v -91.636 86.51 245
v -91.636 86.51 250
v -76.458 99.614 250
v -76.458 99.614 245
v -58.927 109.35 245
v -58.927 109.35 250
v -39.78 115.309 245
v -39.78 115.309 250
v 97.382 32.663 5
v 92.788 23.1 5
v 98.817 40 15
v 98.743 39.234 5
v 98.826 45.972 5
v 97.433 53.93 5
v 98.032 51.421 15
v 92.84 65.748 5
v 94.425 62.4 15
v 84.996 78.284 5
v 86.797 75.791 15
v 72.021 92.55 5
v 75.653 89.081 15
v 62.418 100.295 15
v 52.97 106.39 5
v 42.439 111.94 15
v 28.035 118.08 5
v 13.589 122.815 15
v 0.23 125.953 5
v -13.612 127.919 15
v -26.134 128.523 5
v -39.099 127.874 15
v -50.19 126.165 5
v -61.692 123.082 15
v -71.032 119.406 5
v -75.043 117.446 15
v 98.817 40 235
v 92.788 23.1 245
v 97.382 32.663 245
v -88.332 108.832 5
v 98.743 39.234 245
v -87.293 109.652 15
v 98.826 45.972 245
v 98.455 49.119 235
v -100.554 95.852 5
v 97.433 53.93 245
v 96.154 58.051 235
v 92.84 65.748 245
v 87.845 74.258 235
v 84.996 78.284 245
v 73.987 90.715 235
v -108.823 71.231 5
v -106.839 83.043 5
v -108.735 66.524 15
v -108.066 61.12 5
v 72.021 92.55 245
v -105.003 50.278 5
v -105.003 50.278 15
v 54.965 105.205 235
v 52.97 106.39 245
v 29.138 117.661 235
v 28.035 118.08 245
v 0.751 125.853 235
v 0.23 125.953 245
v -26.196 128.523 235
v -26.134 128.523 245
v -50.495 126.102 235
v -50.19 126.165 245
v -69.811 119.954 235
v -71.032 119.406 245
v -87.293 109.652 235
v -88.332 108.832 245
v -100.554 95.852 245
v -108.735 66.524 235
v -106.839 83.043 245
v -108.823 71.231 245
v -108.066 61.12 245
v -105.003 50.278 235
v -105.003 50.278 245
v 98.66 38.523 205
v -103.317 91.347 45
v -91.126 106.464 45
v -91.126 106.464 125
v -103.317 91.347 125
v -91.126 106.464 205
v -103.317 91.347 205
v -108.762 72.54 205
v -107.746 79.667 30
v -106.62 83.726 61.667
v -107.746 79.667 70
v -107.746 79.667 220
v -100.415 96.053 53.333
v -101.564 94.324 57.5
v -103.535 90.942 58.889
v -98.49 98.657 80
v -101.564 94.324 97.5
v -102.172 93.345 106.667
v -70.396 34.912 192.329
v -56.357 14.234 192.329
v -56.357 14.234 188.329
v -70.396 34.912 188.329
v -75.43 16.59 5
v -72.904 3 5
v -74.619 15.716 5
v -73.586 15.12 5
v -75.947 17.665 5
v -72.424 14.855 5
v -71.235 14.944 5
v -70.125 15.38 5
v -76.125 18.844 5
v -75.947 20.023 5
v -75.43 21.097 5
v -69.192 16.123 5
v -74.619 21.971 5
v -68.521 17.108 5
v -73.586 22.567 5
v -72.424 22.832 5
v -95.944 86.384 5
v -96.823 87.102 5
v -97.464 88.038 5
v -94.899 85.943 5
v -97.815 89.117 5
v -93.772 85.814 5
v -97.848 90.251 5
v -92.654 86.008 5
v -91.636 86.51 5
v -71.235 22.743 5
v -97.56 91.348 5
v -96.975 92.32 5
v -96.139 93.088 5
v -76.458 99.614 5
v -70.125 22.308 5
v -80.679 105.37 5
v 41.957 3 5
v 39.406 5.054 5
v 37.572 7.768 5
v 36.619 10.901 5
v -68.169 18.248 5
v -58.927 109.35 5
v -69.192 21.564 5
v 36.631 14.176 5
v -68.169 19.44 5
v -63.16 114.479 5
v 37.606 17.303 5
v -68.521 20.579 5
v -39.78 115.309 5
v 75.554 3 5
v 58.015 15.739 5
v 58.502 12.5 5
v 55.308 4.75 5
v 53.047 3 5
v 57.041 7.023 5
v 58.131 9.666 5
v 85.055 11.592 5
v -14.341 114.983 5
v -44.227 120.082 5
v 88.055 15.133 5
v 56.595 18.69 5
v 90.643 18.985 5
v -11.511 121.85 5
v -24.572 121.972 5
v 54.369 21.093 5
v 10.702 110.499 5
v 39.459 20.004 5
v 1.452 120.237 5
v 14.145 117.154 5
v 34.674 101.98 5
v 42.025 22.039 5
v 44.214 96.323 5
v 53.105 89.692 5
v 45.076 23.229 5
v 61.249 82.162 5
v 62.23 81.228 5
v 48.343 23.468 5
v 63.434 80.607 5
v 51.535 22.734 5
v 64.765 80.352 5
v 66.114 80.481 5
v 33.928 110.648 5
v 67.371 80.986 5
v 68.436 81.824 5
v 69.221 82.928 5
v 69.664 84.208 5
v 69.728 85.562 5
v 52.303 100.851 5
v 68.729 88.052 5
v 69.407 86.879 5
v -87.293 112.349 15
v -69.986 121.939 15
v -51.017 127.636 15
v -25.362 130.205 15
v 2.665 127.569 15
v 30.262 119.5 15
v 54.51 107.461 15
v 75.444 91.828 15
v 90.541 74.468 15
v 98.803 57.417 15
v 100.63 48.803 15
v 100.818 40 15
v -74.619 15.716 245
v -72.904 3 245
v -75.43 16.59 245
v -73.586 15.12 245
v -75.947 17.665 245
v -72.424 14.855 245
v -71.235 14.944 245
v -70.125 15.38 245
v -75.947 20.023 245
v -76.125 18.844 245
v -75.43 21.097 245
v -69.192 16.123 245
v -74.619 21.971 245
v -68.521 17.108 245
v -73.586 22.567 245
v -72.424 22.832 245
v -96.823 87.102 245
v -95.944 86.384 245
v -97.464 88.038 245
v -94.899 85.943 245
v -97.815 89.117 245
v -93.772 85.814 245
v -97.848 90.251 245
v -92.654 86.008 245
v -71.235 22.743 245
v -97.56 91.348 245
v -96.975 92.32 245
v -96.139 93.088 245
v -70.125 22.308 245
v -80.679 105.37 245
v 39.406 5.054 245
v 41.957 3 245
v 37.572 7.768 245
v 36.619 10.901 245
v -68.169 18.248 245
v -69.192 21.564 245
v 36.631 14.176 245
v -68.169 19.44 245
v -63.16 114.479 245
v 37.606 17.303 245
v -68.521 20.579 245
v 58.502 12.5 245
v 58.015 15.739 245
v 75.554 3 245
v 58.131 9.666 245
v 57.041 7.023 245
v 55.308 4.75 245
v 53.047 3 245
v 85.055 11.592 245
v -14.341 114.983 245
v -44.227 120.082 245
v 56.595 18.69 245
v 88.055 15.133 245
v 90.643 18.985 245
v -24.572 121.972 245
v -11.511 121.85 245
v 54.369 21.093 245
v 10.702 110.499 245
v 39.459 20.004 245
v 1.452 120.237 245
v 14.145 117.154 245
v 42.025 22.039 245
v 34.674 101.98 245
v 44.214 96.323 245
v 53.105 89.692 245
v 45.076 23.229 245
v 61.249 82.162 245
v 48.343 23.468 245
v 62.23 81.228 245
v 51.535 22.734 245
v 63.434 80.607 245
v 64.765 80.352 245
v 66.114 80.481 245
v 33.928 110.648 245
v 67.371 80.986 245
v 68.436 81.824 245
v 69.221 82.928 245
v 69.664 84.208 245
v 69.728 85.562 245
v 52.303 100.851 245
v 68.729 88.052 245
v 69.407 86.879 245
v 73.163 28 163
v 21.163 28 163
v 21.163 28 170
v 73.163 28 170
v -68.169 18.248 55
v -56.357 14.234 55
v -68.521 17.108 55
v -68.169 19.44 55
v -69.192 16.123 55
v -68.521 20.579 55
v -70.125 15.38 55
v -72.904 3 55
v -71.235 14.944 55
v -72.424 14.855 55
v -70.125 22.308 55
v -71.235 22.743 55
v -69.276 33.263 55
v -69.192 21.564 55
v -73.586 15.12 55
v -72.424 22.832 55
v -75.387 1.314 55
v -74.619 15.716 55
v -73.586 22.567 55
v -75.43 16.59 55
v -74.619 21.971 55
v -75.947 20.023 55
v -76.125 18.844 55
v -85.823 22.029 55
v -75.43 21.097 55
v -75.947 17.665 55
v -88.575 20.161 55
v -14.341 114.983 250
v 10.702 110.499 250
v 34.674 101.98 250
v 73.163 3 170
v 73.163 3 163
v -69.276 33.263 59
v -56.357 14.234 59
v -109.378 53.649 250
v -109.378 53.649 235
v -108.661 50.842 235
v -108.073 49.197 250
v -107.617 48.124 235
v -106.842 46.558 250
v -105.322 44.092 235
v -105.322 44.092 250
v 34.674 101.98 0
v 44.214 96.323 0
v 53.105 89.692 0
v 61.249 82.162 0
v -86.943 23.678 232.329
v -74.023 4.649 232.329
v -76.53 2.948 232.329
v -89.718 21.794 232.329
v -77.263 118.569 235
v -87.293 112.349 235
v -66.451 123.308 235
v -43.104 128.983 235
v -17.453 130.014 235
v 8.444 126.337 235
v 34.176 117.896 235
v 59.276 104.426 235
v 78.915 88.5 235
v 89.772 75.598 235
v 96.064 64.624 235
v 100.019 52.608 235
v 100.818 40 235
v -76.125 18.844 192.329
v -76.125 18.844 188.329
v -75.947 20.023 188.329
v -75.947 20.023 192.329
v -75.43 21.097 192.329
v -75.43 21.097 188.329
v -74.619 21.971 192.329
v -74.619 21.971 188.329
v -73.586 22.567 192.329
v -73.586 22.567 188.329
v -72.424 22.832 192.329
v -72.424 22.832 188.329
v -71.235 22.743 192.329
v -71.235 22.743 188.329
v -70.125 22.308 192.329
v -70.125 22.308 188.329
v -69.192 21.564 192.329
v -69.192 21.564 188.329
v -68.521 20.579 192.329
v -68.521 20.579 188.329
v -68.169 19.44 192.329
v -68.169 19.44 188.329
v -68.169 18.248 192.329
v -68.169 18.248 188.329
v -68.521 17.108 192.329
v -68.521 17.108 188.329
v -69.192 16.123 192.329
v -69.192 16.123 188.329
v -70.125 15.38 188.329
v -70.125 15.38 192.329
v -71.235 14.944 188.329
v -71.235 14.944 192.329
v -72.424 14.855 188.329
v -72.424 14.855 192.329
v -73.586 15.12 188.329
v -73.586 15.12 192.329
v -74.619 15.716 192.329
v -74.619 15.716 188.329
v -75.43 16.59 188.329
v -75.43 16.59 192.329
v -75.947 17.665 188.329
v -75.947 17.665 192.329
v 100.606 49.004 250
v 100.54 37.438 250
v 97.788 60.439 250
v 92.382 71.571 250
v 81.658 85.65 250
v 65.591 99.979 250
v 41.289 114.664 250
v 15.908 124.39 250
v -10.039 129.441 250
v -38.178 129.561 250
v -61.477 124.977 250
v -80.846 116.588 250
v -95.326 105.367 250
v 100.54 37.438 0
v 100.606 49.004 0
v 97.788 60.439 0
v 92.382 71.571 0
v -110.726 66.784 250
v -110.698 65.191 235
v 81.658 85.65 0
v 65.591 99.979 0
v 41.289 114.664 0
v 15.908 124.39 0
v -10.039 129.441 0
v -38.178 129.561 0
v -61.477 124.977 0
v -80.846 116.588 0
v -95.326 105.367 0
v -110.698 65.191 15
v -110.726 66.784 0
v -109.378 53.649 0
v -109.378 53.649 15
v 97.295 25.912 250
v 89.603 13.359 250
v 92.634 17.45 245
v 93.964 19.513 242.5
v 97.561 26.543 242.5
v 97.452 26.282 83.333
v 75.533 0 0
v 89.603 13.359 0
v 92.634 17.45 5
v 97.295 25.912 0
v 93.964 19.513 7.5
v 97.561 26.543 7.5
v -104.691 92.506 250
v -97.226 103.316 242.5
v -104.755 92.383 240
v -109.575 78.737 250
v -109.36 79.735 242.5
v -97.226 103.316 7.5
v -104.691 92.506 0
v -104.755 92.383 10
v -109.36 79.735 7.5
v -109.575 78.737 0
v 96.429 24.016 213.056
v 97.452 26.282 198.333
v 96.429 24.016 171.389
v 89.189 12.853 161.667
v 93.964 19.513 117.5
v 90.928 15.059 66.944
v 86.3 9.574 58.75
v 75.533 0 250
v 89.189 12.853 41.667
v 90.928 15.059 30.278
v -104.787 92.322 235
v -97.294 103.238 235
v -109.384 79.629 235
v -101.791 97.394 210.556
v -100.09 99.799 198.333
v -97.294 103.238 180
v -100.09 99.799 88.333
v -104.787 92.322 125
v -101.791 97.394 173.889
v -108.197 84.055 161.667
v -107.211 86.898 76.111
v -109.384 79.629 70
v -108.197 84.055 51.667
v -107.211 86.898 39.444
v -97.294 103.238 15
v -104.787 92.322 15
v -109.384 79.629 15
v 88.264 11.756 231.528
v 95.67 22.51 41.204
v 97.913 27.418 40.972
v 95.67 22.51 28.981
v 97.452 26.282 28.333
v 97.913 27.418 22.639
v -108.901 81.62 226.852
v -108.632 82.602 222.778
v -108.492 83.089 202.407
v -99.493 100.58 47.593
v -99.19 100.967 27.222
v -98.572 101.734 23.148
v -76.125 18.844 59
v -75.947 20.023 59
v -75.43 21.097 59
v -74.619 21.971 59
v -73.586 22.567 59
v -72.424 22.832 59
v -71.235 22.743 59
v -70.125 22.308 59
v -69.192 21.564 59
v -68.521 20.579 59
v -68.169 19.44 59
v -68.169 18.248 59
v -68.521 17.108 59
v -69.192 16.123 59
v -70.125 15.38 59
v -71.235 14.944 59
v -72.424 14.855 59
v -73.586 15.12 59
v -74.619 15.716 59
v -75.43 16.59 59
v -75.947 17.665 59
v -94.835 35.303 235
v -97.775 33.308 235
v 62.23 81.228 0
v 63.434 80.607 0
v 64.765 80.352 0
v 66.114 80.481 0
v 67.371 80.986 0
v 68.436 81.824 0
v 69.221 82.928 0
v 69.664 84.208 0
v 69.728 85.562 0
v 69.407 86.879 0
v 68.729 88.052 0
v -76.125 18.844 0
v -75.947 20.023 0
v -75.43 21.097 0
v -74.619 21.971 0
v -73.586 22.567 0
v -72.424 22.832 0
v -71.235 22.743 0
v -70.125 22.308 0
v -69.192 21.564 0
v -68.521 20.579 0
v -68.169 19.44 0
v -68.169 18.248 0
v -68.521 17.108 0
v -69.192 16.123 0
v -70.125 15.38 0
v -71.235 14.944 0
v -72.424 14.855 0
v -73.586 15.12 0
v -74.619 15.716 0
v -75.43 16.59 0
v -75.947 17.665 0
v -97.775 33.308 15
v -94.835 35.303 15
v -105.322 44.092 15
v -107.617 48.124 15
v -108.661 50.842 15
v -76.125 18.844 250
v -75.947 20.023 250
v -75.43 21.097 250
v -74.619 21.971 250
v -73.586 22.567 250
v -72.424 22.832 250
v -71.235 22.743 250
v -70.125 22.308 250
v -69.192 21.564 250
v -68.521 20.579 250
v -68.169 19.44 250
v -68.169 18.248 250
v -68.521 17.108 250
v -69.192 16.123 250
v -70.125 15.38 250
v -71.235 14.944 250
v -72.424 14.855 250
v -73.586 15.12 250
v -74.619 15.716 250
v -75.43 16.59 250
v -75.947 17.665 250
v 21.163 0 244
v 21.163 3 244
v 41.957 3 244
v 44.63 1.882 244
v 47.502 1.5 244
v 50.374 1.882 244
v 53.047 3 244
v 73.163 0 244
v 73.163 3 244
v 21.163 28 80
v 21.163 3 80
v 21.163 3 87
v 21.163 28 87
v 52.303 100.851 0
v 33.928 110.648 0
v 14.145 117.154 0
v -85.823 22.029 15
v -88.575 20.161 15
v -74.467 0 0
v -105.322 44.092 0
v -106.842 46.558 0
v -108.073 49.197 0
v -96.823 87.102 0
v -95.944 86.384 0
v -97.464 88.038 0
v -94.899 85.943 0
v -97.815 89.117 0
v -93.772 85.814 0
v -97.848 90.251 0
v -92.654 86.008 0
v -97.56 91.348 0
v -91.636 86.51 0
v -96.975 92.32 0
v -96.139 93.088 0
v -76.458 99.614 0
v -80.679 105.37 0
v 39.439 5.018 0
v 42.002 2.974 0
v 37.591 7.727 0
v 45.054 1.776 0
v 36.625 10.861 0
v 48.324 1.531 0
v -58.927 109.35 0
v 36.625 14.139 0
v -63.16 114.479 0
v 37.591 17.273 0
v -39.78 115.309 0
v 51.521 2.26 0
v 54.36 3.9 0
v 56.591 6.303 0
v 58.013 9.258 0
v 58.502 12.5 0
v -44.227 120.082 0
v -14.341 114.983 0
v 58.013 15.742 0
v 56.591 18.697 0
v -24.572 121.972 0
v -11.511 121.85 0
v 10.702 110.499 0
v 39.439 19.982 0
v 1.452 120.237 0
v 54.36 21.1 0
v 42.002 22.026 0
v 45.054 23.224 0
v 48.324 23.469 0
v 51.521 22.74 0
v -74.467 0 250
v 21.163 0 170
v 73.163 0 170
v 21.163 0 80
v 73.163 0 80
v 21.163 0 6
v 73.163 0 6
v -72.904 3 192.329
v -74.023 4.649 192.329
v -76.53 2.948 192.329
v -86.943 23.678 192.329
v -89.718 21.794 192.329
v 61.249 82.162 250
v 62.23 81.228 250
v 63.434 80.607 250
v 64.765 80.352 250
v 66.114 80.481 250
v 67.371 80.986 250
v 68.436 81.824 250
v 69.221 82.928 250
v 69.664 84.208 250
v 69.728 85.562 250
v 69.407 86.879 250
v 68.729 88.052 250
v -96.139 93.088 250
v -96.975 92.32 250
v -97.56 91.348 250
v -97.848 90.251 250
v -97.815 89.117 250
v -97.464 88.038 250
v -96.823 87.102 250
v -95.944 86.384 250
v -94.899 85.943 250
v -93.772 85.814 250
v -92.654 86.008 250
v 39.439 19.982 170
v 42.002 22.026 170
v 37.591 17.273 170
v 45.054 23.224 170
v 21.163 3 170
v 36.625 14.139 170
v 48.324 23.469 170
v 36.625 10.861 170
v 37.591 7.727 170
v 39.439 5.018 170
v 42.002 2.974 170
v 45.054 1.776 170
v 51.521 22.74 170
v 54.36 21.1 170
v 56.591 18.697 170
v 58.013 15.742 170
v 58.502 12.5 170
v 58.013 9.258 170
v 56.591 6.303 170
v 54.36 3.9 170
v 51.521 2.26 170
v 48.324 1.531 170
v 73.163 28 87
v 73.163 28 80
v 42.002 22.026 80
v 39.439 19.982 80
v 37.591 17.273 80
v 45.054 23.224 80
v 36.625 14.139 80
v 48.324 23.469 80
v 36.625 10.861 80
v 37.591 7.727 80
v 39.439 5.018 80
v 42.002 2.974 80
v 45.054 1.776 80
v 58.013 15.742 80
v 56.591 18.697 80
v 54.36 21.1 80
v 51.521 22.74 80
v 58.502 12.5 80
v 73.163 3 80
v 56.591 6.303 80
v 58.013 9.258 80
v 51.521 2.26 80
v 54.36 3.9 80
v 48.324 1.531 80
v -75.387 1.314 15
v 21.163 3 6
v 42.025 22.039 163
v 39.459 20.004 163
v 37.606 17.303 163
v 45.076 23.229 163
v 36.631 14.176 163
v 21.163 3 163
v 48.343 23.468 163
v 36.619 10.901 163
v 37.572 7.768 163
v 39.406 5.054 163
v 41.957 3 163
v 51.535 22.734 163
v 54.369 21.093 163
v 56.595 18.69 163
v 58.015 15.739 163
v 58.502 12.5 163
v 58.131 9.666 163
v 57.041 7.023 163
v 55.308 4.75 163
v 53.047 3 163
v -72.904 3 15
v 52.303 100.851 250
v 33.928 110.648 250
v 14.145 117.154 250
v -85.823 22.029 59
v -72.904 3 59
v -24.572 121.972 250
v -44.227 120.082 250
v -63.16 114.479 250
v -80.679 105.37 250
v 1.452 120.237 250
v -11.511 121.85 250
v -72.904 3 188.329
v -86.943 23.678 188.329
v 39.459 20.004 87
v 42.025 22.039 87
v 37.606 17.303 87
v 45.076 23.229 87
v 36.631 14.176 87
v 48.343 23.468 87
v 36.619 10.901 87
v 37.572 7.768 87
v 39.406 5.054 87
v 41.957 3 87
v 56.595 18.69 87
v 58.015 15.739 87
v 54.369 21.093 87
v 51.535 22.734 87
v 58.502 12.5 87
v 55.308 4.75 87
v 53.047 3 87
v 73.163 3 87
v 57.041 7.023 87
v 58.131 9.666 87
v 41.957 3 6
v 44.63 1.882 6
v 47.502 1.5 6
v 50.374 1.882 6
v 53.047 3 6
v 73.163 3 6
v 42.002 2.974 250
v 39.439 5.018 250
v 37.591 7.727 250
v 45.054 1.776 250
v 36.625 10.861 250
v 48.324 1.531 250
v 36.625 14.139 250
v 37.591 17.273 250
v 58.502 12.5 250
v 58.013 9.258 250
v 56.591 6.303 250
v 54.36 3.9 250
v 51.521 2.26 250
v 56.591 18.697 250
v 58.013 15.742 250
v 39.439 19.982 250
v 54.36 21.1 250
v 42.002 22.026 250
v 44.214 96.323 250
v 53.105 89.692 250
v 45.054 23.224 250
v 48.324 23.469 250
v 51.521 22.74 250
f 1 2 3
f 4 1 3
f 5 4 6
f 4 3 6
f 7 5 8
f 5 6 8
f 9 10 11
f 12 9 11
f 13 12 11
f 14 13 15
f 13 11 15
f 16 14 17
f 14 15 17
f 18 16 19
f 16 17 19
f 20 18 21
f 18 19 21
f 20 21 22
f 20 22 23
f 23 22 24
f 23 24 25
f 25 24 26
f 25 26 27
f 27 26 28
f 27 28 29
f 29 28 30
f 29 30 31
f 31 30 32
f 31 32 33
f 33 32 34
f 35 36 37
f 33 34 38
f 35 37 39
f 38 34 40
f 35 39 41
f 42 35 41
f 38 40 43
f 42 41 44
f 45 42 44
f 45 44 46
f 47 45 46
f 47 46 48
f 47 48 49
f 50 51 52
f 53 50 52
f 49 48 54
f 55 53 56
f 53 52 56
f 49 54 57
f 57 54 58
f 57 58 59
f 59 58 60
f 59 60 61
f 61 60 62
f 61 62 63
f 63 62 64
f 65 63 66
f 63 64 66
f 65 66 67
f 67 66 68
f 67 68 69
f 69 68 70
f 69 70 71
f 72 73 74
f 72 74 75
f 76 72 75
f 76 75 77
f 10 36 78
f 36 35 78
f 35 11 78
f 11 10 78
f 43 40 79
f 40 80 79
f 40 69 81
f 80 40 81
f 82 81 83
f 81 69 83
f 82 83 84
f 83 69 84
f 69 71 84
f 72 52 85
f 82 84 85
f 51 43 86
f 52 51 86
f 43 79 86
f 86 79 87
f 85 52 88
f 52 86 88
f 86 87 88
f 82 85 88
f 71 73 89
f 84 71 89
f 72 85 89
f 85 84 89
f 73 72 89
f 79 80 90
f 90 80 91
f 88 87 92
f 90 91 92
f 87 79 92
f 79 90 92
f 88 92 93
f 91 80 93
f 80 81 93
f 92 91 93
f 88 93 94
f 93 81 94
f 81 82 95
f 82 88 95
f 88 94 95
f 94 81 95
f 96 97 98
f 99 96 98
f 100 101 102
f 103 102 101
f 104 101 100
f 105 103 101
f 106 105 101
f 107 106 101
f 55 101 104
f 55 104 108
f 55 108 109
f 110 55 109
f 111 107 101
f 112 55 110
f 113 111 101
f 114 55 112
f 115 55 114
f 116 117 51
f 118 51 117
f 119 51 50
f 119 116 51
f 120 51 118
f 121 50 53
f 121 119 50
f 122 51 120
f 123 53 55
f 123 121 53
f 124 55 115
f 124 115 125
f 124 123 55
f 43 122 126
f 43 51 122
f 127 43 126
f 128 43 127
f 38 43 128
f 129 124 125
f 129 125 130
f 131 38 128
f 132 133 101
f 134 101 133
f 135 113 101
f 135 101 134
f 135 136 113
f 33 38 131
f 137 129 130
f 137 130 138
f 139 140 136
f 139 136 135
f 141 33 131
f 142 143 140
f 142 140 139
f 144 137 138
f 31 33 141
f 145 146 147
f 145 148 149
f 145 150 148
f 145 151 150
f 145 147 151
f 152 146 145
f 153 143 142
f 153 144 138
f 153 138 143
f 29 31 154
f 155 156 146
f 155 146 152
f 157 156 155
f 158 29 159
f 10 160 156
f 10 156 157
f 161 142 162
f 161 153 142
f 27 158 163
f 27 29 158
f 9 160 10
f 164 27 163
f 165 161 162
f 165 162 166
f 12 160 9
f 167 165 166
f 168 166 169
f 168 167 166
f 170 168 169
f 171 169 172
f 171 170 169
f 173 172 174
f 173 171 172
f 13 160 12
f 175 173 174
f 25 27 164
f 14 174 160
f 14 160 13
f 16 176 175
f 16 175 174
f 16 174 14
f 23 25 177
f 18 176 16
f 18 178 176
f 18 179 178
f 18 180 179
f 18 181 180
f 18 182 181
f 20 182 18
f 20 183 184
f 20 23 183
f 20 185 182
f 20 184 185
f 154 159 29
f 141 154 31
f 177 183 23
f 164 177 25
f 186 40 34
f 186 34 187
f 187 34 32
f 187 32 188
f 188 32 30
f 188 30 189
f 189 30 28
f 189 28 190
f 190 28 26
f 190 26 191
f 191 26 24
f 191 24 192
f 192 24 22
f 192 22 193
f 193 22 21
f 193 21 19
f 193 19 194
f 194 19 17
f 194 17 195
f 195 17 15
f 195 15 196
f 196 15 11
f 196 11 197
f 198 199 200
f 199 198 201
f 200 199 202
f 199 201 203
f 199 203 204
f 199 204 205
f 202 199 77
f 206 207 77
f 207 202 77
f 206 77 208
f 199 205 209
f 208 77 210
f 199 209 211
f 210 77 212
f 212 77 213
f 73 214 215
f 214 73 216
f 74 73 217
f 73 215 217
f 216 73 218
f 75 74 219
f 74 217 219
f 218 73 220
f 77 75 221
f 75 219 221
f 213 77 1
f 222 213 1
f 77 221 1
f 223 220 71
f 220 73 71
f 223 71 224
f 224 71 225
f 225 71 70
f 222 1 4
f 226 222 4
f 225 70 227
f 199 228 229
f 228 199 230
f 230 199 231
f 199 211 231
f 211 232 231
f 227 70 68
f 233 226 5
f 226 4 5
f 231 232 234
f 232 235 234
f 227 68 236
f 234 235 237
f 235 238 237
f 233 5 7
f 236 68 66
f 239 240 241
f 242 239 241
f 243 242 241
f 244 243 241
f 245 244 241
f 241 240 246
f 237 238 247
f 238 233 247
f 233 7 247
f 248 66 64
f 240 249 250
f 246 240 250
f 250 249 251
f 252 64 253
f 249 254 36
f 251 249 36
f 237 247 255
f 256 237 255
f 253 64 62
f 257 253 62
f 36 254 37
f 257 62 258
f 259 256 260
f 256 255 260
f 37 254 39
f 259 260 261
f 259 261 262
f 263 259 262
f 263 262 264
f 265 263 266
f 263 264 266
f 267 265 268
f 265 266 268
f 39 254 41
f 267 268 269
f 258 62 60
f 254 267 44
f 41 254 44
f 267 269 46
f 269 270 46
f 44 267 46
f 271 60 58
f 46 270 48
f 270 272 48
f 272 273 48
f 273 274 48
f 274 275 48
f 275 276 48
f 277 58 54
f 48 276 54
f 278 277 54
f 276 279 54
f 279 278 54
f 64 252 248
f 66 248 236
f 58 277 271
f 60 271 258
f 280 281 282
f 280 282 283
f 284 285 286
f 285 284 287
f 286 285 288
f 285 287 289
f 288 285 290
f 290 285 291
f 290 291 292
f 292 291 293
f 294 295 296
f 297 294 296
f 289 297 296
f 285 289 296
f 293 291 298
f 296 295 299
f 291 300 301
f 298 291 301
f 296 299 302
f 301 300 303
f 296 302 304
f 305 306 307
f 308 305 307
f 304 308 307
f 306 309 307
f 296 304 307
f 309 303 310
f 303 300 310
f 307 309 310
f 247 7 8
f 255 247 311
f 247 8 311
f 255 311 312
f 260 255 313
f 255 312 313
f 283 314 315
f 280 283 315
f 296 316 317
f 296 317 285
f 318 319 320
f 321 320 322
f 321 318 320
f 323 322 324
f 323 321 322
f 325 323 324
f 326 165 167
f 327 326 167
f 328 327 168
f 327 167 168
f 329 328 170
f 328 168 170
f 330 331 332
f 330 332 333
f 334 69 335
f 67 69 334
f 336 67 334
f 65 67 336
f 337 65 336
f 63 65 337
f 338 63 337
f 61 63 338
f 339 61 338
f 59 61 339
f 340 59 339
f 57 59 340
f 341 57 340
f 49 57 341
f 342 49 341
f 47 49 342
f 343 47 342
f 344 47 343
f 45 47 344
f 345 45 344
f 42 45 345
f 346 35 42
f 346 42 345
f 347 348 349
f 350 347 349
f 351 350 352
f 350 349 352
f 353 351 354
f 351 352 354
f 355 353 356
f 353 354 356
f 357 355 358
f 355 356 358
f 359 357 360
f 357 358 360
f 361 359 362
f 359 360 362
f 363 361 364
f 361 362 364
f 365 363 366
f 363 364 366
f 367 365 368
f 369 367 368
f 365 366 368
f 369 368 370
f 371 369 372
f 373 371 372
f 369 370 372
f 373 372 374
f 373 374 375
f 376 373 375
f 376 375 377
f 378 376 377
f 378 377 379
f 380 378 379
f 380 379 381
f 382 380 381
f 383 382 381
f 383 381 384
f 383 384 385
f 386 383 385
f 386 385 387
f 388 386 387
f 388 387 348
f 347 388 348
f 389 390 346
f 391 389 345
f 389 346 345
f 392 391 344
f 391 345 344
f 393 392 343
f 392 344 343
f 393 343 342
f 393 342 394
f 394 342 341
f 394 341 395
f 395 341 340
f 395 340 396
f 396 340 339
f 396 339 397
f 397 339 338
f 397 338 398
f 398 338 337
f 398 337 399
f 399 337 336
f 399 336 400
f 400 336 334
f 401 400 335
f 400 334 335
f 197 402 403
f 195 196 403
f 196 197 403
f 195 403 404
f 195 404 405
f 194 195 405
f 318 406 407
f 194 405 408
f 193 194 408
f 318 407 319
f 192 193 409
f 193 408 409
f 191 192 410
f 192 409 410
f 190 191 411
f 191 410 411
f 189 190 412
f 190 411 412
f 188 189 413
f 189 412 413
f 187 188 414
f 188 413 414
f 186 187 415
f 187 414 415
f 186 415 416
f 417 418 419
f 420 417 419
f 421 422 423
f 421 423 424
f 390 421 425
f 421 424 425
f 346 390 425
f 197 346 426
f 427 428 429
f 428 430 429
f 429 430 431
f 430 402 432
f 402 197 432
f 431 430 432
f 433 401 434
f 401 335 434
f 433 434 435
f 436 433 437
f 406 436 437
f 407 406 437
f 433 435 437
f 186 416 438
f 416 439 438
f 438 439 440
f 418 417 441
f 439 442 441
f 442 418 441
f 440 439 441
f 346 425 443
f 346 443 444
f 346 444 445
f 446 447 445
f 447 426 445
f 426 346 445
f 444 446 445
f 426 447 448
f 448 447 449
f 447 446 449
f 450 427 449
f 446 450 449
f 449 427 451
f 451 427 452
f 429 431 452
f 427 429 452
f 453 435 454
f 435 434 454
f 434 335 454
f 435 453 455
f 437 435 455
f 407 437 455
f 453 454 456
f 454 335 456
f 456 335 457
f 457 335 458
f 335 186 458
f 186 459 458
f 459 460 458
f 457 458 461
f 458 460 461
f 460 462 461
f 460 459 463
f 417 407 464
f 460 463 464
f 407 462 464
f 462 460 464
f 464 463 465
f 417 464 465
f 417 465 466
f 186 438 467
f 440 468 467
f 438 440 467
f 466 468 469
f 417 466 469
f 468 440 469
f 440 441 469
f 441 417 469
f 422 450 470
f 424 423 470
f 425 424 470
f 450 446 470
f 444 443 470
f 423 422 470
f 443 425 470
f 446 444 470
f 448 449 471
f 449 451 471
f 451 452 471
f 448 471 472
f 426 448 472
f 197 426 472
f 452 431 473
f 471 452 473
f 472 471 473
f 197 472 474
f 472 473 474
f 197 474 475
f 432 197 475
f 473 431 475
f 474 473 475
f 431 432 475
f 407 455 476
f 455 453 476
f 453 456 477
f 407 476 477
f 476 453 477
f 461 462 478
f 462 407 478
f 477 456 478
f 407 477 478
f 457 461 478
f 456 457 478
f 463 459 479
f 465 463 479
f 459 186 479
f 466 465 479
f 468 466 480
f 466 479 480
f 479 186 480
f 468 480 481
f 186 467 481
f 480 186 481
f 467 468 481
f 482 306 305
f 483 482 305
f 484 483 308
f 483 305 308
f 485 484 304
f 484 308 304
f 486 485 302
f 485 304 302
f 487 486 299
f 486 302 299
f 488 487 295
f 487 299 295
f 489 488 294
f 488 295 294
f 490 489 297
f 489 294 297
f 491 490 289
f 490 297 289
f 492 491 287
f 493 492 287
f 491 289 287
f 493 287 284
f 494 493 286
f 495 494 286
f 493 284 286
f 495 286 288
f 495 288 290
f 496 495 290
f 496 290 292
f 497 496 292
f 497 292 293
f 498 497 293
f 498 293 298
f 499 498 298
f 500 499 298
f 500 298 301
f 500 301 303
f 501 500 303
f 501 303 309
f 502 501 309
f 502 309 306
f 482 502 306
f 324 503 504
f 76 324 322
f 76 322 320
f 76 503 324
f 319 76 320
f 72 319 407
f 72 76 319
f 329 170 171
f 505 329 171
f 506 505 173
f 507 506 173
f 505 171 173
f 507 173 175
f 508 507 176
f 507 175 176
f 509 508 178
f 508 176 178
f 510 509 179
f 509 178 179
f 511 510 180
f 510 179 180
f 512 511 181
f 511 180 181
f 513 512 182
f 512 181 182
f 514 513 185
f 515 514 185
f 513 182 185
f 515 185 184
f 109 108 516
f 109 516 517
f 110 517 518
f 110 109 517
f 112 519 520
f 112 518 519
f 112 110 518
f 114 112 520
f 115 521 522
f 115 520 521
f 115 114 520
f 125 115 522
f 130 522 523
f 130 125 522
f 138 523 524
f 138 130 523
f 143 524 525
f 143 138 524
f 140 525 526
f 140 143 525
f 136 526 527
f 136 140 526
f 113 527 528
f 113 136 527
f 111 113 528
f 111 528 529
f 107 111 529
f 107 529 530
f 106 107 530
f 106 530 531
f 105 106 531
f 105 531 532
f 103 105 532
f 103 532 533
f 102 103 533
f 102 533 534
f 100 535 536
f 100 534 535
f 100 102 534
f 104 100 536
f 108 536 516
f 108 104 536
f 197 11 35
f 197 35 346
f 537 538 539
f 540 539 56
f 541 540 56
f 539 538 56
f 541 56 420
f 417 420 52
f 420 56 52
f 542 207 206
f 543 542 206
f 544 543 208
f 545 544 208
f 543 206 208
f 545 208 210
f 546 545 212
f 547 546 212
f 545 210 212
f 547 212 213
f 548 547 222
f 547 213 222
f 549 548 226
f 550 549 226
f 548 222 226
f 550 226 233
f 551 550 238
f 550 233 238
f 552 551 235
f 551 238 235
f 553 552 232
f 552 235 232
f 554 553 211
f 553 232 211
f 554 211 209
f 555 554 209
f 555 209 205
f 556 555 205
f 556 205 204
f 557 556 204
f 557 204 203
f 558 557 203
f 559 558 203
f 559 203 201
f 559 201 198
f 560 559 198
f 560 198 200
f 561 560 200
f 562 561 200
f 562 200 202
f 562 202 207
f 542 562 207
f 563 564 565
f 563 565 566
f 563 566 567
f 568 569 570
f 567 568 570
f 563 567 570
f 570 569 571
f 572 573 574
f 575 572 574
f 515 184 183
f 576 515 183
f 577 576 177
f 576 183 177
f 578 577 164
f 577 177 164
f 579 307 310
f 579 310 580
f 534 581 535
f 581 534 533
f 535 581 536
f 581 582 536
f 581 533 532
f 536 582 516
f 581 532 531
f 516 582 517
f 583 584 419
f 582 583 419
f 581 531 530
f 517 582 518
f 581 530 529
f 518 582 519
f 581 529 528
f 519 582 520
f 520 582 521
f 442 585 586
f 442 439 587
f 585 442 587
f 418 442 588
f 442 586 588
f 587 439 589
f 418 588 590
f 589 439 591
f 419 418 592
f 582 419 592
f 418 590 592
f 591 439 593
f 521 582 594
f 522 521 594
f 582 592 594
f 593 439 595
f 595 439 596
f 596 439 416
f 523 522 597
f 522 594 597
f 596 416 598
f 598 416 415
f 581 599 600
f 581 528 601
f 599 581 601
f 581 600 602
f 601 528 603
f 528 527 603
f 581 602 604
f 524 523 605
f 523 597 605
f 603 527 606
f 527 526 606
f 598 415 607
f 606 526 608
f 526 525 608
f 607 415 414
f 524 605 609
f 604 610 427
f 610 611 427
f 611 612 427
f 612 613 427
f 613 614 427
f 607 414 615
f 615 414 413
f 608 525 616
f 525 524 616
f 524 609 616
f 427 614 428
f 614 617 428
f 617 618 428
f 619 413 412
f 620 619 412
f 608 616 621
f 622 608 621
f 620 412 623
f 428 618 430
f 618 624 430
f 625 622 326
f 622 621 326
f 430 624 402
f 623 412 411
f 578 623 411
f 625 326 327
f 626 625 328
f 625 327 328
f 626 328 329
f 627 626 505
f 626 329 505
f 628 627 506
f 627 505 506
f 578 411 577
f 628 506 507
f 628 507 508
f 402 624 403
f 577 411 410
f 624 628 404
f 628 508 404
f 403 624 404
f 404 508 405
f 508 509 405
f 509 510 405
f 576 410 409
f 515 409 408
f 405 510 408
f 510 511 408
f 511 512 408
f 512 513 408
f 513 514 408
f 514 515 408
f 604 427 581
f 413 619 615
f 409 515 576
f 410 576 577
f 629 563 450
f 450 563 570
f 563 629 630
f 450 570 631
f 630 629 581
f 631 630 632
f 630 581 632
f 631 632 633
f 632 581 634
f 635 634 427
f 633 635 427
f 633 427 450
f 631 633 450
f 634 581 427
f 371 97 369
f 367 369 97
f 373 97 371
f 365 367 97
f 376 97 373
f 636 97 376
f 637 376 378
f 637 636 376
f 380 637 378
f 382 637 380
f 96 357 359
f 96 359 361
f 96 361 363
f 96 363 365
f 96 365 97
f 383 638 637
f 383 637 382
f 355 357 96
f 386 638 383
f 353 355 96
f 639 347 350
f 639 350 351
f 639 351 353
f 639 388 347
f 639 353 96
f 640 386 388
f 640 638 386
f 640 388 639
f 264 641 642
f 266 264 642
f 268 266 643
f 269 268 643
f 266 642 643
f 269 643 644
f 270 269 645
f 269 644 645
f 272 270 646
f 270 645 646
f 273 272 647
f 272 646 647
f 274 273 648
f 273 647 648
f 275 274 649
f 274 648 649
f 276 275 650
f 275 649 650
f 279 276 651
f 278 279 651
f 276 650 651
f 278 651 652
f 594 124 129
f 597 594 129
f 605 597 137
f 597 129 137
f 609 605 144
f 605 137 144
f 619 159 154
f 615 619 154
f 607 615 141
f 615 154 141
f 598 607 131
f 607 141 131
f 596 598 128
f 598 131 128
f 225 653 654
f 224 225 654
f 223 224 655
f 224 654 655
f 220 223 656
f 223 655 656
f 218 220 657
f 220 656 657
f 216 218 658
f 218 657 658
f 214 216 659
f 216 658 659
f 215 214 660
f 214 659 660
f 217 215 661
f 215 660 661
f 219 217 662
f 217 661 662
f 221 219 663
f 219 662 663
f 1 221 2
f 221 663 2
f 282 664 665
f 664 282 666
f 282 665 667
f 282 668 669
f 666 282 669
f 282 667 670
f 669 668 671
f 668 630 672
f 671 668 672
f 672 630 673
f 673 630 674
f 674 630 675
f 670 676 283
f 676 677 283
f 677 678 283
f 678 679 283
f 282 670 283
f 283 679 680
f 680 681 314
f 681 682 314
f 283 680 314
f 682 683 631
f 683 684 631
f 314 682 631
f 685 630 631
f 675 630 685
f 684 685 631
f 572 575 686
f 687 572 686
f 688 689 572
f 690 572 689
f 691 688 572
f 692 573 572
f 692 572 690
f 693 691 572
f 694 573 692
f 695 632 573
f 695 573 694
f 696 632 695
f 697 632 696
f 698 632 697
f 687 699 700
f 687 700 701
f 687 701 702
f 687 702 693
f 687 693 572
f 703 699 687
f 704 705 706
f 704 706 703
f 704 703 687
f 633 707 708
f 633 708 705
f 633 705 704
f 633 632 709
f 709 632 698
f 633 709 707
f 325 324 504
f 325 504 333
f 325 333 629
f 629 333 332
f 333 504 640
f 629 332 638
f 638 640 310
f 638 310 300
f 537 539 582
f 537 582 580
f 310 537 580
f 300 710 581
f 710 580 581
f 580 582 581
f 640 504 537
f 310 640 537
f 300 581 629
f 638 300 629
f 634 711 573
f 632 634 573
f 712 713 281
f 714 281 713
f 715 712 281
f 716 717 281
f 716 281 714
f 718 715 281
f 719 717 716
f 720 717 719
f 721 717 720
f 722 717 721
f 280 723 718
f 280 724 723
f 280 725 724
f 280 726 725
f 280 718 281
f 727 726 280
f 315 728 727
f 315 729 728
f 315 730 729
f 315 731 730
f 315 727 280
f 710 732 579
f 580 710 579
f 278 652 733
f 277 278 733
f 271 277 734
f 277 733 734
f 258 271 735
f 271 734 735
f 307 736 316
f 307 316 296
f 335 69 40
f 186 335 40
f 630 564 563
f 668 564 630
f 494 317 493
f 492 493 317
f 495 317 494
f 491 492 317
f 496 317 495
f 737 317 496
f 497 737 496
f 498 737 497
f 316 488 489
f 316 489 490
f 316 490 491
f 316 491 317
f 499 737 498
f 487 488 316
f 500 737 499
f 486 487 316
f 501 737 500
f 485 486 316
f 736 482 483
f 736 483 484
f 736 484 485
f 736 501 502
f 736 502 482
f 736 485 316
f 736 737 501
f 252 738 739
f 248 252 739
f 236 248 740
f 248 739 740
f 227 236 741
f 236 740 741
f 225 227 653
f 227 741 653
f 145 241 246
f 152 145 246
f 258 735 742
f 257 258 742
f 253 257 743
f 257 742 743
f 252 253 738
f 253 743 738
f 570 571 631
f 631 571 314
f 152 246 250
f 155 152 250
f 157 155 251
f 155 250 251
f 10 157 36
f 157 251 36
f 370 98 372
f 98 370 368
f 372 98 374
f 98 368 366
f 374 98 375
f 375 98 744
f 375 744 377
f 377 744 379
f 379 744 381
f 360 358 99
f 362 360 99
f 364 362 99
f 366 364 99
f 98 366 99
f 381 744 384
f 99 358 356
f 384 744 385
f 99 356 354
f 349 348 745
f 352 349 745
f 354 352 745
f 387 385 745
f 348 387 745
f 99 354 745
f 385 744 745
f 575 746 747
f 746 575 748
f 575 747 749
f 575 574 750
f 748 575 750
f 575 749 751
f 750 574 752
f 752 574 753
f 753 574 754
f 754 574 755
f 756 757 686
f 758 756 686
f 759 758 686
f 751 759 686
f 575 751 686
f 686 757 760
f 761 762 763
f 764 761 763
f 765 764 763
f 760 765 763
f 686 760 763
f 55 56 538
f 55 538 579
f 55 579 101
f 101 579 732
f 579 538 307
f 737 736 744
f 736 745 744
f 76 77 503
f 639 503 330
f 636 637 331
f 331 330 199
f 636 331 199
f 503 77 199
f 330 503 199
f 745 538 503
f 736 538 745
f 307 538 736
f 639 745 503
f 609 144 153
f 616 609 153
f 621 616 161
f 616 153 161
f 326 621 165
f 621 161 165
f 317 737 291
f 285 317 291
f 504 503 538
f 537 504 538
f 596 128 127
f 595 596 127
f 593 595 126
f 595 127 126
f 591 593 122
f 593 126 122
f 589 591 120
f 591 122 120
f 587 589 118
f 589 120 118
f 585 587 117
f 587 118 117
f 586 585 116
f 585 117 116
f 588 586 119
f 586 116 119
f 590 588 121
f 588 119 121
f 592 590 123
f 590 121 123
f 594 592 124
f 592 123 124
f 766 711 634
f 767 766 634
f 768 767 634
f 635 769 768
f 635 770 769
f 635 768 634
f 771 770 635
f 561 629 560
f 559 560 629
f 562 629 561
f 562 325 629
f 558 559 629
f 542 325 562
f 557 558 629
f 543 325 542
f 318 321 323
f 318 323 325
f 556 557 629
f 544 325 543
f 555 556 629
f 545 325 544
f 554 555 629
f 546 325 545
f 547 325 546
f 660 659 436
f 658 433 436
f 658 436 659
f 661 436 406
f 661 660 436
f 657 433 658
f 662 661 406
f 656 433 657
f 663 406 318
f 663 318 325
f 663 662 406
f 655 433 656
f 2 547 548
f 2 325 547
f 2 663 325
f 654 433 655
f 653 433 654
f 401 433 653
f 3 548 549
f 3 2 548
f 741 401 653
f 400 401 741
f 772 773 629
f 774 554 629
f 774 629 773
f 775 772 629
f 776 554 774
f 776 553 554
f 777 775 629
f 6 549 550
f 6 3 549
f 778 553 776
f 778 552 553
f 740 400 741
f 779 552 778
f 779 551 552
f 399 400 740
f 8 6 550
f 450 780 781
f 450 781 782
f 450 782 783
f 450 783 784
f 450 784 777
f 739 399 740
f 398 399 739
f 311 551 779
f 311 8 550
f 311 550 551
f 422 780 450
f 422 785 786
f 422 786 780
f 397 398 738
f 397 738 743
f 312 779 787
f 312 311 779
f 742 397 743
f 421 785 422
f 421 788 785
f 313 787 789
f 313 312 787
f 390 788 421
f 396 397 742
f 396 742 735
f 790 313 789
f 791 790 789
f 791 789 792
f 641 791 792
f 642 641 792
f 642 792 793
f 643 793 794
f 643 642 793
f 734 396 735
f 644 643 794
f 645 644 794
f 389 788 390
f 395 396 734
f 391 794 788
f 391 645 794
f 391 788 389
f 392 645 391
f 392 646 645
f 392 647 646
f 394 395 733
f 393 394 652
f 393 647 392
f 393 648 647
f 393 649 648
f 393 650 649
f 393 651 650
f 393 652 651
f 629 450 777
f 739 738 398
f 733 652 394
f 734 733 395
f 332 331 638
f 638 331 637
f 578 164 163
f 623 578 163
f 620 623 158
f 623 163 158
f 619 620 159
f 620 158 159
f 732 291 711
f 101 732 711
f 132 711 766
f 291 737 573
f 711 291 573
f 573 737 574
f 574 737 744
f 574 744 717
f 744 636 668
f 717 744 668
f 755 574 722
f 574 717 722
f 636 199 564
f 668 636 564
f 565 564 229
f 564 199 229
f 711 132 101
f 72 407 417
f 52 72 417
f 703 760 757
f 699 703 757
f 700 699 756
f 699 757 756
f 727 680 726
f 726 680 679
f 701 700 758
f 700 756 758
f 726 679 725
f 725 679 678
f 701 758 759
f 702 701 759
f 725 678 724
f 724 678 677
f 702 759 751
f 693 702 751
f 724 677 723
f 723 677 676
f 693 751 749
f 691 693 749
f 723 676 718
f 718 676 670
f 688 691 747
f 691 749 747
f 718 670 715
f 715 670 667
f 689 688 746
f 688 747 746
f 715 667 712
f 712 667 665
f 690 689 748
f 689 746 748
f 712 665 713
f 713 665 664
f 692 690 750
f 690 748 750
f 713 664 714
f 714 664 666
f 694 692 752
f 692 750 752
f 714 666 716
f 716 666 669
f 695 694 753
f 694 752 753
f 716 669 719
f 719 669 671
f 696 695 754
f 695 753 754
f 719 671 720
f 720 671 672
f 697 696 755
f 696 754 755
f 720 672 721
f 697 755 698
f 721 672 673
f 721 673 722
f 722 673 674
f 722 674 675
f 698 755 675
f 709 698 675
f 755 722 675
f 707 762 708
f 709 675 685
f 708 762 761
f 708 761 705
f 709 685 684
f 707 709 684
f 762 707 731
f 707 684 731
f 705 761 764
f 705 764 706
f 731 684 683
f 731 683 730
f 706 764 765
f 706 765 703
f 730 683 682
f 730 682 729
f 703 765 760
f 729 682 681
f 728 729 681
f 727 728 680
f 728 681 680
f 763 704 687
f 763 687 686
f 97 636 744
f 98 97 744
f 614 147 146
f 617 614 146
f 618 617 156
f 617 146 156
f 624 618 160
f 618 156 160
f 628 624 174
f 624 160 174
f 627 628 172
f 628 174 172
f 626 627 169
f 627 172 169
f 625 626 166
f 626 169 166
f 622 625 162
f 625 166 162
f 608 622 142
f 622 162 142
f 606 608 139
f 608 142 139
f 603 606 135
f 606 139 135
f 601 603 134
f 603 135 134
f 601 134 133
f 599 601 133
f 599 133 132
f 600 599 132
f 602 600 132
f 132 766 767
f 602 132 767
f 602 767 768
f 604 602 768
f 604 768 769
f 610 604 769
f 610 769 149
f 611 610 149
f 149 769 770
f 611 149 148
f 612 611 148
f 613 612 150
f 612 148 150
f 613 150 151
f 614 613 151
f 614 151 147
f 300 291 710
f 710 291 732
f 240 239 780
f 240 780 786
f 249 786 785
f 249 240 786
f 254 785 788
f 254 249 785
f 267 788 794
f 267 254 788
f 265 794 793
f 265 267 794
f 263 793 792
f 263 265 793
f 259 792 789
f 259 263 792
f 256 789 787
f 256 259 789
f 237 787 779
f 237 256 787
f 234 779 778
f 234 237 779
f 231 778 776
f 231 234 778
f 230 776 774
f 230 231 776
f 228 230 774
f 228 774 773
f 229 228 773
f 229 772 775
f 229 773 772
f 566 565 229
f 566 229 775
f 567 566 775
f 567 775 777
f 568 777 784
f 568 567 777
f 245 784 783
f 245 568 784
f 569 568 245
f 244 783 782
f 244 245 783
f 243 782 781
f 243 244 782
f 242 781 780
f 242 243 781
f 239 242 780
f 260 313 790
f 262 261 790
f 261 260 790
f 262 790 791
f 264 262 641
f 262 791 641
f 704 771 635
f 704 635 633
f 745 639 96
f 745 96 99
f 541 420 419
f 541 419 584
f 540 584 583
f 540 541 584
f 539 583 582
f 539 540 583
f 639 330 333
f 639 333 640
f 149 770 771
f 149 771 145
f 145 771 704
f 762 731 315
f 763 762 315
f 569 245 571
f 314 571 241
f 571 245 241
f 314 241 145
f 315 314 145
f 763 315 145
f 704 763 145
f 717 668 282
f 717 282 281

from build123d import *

# Parameters (mm, degrees)
BOSS_EXTRUDE1_DEPTH      = 250
CUT_EXTRUDE1_START       = -5
CUT_EXTRUDE1_DEPTH       = 240
CUT_EXTRUDE2_START       = 40
SKETCH3_W                = 188.244995532
SKETCH3_H                = 220
CUT_EXTRUDE2_DEPTH       = 236
FILLET1_R                = 25
SKETCH16_W               = 40
SKETCH16_H               = 23
CUT_EXTRUDE11_DEPTH      = 170
SKETCH17_W               = 4
SKETCH17_H               = 24.99344169
SKETCH17_H_2             = 23
BOSS_EXTRUDE5_DEPTH      = 20
SKETCH18_R               = 4
CUT_EXTRUDE12_DEPTH      = 56.0000001
CUT_EXTRUDE12_DEPTH_BACK = 196.0000001
SKETCH26_W               = 52
SKETCH26_H               = 74
CUT_EXTRUDE13_DEPTH      = 10
SKETCH27_W               = 52
SKETCH27_H               = 7
BOSS_EXTRUDE6_DEPTH      = 25
SKETCH29_R               = 11
CUT_EXTRUDE14_DEPTH      = 164.0000001
CUT_EXTRUDE14_DEPTH_BACK = 88.0000001
SKETCH31_W               = 220
SKETCH31_H               = 33.637756758
CUT_EXTRUDE15_DEPTH      = 216.289478638
CUT_EXTRUDE15_DEPTH_BACK = 33.977288489
CUT_EXTRUDE17_DEPTH      = 1.0000001
CUT_EXTRUDE17_DEPTH_BACK = 251.0000001


with BuildPart() as part:
    # Sketch1 → Boss-Extrude1 (new body)
    with BuildSketch(Plane.XY):
        with BuildLine():
            Line((-74.466852712, 0), (75.533147288, 0))
            add(Edge.make_bspline(
                [(75.533147288, 0), (138.063372934, 47.200510513), (16.470001542, 172.007803308), (-124.949591118, 111.301552399), (-108.081203548, 48.03596108)],
                knots=[0, 0, 0, 0, 0.526874503, 1, 1, 1, 1], degree=3))
            Line((-108.081203548, 48.03596108), (-74.466852712, 0))
        make_face()
    extrude(amount=BOSS_EXTRUDE1_DEPTH)

    # Sketch2 → Cut-Extrude1 (cut)
    with BuildSketch(Plane.XY.offset(250).offset(CUT_EXTRUDE1_START)):
        with BuildLine():
            Line((-105.002588912, 50.278247003), (-72.903738951, 3))
            Line((-72.903738951, 3), (73.163375947, 3))
            Line((73.163375947, 3), (75.554047329, 3))
            Line((75.554047329, 3), (85.055106359, 11.591701144))
            ThreePointArc((85.055106359, 11.591701144), (89.402345548, 17.022720611), (92.788433069, 23.09963367))
            add(Edge.make_bspline(
                [(92.788433069, 23.09963367), (96.812719468, 29.154161293), (103.314814409, 50.201439356), (80.501543446, 89.980370093), (42.540150732, 114.005749807), (-11.832065214, 131.764317978), (-81.096743835, 126.81989126), (-117.24410327, 82.158250279), (-105.002588912, 50.278247003)],
                knots=[0.063093748, 0.063093748, 0.063093748, 0.063093748, 0.12675304, 0.268313114, 0.414746674, 0.542882576, 0.761532881, 1, 1, 1, 1], degree=3))
        make_face()
    extrude(amount=-CUT_EXTRUDE1_DEPTH, mode=Mode.SUBTRACT)

    # Sketch3 → Cut-Extrude2 (cut)
    with BuildSketch(Plane(origin=(0, 0, 0), x_dir=(1, 0, 0), z_dir=(0, 1, 0)).offset(CUT_EXTRUDE2_START)):
        with Locations((6.82953452, -125)):
            Rectangle(SKETCH3_W, SKETCH3_H)
    extrude(amount=CUT_EXTRUDE2_DEPTH, mode=Mode.SUBTRACT)

    # Fillet1
    fillet1_edges = [part.edges().sort_by_distance(p)[0] for p in [
        (-108.081203548, 48.03596108, 125),
    ]]
    fillet(fillet1_edges, radius=FILLET1_R)

    # Sketch16 → Cut-Extrude11 (cut)
    with BuildSketch(Plane(origin=(-48.507348666, -32.933329925, 0), x_dir=(0, 0, -1), z_dir=(0.827336045, 0.561707281, 0))):
        with Locations((-212.328725108, 56.926010788)):
            Rectangle(SKETCH16_W, SKETCH16_H)
        with Locations((-35, 54.932569098)):
            Rectangle(SKETCH16_W, SKETCH16_H)
    extrude(amount=-CUT_EXTRUDE11_DEPTH, mode=Mode.SUBTRACT)

    # Sketch17 → Boss-Extrude5 (add)
    with BuildSketch(Plane(origin=(-48.507348666, -32.933329925, 0), x_dir=(0, 0, -1), z_dir=(0.827336045, 0.561707281, 0))):
        with Locations((-190.328725108, 55.929289943)):
            Rectangle(SKETCH17_W, SKETCH17_H)
        with Locations((-57, 54.932569098)):
            Rectangle(SKETCH17_W, SKETCH17_H_2)
    extrude(amount=BOSS_EXTRUDE5_DEPTH)

    # Sketch18 → Cut-Extrude12 (cut, two sides)
    with BuildSketch(Plane(origin=(0, 0, 55), x_dir=(-1, 0, 0), z_dir=(0, 0, -1))) as cut_extrude12_sk:
        with Locations((72.12467311, 18.843671615)):
            Circle(SKETCH18_R)
    extrude(amount=CUT_EXTRUDE12_DEPTH, mode=Mode.SUBTRACT)
    extrude(cut_extrude12_sk.sketch, amount=-CUT_EXTRUDE12_DEPTH_BACK, mode=Mode.SUBTRACT)

    # Sketch26 → Cut-Extrude13 (cut)
    with BuildSketch(Plane(origin=(0, 3, 0), x_dir=(1, 0, 0), z_dir=(0, 1, 0))):
        with Locations((47.163460131, -207)):
            Rectangle(SKETCH26_W, SKETCH26_H)
    cut_extrude13 = extrude(amount=-CUT_EXTRUDE13_DEPTH, mode=Mode.SUBTRACT)

    # Sketch27 → Boss-Extrude6 (add)
    with BuildSketch(Plane(origin=(0, 3, 0), x_dir=(1, 0, 0), z_dir=(0, 1, 0))):
        with Locations((47.163460131, -166.5)):
            Rectangle(SKETCH27_W, SKETCH27_H)
    boss_extrude6 = extrude(amount=BOSS_EXTRUDE6_DEPTH)

    # Mirror1: Cut-Extrude13, Boss-Extrude6 across plane
    add(cut_extrude13.mirror(Plane.XY.offset(125)), mode=Mode.SUBTRACT)
    add(boss_extrude6.mirror(Plane.XY.offset(125)))

    # Sketch29 → Cut-Extrude14 (cut, two sides)
    with BuildSketch(Plane.XY.offset(87)) as cut_extrude14_sk:
        with Locations((47.502101682, 12.5)):
            Circle(SKETCH29_R)
    extrude(amount=CUT_EXTRUDE14_DEPTH, mode=Mode.SUBTRACT)
    extrude(cut_extrude14_sk.sketch, amount=-CUT_EXTRUDE14_DEPTH_BACK, mode=Mode.SUBTRACT)

    # Sketch31 → Cut-Extrude15 (cut, two sides)
    with BuildSketch(Plane(origin=(-48.507348666, -32.933329925, 0), x_dir=(0, 0, -1), z_dir=(0.827336045, 0.561707281, 0))) as cut_extrude15_sk:
        with Locations((-125, 99.296236359)):
            Rectangle(SKETCH31_W, SKETCH31_H)
    extrude(amount=CUT_EXTRUDE15_DEPTH, mode=Mode.SUBTRACT)
    extrude(cut_extrude15_sk.sketch, amount=-CUT_EXTRUDE15_DEPTH_BACK, mode=Mode.SUBTRACT)

    # Sketch33 → Cut-Extrude17 (cut, two sides)
    with BuildSketch(Plane.XY.offset(250)) as cut_extrude17_sk:
        with BuildLine():
            ThreePointArc((-96.139108118, 93.087727905), (-97.176714819, 87.547181157), (-91.636168071, 86.509574455))
            ThreePointArc((-91.636168071, 86.509574455), (-67.942373177, 104.932123716), (-39.780049997, 115.308529202))
            ThreePointArc((-39.780049997, 115.308529202), (-1.727579676, 113.255761081), (34.673746596, 101.979777748))
            ThreePointArc((34.673746596, 101.979777748), (48.746993578, 93.12467921), (61.24866353, 82.162138486))
            ThreePointArc((61.24866353, 82.162138486), (67.933695568, 81.366522268), (68.729311786, 88.051554307))
            ThreePointArc((68.729311786, 88.051554307), (43.326237947, 106.145331635), (14.145463416, 117.153661945))
            ThreePointArc((14.145463416, 117.153661945), (-5.006170904, 121.228745495), (-24.572430668, 121.972305781))
            ThreePointArc((-24.572430668, 121.972305781), (-63.160343802, 114.478848604), (-96.139108118, 93.087727905))
        make_face()
    extrude(amount=CUT_EXTRUDE17_DEPTH, mode=Mode.SUBTRACT)
    extrude(cut_extrude17_sk.sketch, amount=-CUT_EXTRUDE17_DEPTH_BACK, mode=Mode.SUBTRACT)


solid = part.part
